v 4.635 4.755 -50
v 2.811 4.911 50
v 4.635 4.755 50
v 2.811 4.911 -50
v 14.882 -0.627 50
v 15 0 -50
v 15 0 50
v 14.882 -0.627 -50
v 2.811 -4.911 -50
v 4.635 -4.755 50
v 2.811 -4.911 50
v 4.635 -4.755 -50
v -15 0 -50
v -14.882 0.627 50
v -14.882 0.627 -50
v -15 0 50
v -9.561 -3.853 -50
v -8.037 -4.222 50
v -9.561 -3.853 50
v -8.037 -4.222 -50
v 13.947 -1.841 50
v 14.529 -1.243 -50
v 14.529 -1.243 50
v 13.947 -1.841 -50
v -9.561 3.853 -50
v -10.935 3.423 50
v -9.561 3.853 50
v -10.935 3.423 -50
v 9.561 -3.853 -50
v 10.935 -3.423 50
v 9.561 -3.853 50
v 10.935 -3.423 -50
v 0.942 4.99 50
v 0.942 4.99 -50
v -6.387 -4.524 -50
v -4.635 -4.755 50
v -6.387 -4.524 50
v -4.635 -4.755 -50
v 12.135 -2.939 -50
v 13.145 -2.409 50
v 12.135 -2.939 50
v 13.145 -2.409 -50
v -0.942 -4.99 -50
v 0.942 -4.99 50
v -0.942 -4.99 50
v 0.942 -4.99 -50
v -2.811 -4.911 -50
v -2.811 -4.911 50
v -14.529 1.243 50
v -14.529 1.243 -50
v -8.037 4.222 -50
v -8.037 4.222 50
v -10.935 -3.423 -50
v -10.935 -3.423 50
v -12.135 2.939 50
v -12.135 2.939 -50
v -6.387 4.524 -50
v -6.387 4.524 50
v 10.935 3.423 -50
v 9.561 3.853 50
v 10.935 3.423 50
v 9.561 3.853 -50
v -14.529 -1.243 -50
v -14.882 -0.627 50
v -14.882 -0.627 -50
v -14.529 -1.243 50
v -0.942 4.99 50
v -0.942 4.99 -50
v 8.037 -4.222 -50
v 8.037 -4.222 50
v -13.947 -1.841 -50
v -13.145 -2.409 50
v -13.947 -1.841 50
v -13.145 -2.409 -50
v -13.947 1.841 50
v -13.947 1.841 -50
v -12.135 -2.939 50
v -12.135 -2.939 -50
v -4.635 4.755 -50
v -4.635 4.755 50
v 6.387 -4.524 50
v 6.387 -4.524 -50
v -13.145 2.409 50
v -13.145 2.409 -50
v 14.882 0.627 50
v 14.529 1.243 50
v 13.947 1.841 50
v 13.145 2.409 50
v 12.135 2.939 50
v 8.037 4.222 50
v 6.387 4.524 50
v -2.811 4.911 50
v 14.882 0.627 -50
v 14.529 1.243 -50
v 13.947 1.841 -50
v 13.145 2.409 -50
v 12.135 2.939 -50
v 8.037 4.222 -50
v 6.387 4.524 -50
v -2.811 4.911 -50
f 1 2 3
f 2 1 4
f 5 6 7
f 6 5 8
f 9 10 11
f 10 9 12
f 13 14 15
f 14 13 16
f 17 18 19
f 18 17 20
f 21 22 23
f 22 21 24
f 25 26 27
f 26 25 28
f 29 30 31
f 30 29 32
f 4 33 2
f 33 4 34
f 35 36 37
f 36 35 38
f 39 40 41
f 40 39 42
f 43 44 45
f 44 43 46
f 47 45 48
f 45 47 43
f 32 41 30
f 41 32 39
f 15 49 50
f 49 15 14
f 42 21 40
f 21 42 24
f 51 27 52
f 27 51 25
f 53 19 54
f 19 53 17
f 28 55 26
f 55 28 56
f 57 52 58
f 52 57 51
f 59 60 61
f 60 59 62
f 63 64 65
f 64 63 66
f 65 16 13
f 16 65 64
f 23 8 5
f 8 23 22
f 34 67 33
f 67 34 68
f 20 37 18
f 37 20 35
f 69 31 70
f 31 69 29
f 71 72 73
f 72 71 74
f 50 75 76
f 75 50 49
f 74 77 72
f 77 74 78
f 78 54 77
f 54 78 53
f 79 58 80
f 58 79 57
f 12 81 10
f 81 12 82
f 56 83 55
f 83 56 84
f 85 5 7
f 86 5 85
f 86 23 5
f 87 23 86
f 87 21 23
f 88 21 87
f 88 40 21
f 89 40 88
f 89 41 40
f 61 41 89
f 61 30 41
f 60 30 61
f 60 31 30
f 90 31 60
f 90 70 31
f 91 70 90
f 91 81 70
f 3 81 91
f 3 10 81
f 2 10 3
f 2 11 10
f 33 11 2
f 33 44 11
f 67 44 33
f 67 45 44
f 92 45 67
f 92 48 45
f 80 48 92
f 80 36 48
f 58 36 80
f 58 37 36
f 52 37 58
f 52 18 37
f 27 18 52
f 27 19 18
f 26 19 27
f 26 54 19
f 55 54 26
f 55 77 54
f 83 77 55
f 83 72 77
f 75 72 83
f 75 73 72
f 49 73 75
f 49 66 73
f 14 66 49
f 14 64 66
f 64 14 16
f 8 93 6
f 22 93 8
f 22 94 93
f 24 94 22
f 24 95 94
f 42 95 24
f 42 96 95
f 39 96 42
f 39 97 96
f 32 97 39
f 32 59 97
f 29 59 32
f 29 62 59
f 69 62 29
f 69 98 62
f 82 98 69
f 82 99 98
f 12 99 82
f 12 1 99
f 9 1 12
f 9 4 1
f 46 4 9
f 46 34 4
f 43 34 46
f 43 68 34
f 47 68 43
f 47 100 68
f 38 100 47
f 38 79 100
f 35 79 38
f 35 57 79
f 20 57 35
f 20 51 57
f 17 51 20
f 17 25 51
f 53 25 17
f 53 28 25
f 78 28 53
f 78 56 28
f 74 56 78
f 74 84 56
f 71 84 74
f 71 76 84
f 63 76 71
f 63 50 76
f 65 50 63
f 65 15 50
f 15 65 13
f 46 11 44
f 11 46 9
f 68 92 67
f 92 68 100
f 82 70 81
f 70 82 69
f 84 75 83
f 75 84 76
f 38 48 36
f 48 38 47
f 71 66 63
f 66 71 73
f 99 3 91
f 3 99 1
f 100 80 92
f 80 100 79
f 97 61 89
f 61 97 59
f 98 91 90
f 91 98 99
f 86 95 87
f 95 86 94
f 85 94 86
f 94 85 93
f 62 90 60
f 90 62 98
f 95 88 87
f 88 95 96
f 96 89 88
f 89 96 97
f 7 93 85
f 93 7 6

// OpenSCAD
/*
rotate_extrude($fn = 300)
translate([30,0,0]){
scale([1,2])
circle(d = 10, $fn = 100);
translate([7,0,0])
circle(d = 5 , $fn = 100);
}
*/

/*
linear_extrude(
height=30, 
center =  true,
scale = [1, 1], 
twist = 180, 
slices = 200
)
square([20, 5], center =  true);

*/

linear_extrude(
height = 100, 
center =  true, 
scale = 1 , 
twist = 1080*sin(360*$t), 
slices = 100)
scale([3, 1])
circle(d = 10, $fn = 50);



linear_extrude(
height = 100, 
center =  true, 
scale = 1 , 
twist = -1080*sin(360*$t), 
slices = 100)
scale([3, 1])
circle(d = 10, $fn = 50);
